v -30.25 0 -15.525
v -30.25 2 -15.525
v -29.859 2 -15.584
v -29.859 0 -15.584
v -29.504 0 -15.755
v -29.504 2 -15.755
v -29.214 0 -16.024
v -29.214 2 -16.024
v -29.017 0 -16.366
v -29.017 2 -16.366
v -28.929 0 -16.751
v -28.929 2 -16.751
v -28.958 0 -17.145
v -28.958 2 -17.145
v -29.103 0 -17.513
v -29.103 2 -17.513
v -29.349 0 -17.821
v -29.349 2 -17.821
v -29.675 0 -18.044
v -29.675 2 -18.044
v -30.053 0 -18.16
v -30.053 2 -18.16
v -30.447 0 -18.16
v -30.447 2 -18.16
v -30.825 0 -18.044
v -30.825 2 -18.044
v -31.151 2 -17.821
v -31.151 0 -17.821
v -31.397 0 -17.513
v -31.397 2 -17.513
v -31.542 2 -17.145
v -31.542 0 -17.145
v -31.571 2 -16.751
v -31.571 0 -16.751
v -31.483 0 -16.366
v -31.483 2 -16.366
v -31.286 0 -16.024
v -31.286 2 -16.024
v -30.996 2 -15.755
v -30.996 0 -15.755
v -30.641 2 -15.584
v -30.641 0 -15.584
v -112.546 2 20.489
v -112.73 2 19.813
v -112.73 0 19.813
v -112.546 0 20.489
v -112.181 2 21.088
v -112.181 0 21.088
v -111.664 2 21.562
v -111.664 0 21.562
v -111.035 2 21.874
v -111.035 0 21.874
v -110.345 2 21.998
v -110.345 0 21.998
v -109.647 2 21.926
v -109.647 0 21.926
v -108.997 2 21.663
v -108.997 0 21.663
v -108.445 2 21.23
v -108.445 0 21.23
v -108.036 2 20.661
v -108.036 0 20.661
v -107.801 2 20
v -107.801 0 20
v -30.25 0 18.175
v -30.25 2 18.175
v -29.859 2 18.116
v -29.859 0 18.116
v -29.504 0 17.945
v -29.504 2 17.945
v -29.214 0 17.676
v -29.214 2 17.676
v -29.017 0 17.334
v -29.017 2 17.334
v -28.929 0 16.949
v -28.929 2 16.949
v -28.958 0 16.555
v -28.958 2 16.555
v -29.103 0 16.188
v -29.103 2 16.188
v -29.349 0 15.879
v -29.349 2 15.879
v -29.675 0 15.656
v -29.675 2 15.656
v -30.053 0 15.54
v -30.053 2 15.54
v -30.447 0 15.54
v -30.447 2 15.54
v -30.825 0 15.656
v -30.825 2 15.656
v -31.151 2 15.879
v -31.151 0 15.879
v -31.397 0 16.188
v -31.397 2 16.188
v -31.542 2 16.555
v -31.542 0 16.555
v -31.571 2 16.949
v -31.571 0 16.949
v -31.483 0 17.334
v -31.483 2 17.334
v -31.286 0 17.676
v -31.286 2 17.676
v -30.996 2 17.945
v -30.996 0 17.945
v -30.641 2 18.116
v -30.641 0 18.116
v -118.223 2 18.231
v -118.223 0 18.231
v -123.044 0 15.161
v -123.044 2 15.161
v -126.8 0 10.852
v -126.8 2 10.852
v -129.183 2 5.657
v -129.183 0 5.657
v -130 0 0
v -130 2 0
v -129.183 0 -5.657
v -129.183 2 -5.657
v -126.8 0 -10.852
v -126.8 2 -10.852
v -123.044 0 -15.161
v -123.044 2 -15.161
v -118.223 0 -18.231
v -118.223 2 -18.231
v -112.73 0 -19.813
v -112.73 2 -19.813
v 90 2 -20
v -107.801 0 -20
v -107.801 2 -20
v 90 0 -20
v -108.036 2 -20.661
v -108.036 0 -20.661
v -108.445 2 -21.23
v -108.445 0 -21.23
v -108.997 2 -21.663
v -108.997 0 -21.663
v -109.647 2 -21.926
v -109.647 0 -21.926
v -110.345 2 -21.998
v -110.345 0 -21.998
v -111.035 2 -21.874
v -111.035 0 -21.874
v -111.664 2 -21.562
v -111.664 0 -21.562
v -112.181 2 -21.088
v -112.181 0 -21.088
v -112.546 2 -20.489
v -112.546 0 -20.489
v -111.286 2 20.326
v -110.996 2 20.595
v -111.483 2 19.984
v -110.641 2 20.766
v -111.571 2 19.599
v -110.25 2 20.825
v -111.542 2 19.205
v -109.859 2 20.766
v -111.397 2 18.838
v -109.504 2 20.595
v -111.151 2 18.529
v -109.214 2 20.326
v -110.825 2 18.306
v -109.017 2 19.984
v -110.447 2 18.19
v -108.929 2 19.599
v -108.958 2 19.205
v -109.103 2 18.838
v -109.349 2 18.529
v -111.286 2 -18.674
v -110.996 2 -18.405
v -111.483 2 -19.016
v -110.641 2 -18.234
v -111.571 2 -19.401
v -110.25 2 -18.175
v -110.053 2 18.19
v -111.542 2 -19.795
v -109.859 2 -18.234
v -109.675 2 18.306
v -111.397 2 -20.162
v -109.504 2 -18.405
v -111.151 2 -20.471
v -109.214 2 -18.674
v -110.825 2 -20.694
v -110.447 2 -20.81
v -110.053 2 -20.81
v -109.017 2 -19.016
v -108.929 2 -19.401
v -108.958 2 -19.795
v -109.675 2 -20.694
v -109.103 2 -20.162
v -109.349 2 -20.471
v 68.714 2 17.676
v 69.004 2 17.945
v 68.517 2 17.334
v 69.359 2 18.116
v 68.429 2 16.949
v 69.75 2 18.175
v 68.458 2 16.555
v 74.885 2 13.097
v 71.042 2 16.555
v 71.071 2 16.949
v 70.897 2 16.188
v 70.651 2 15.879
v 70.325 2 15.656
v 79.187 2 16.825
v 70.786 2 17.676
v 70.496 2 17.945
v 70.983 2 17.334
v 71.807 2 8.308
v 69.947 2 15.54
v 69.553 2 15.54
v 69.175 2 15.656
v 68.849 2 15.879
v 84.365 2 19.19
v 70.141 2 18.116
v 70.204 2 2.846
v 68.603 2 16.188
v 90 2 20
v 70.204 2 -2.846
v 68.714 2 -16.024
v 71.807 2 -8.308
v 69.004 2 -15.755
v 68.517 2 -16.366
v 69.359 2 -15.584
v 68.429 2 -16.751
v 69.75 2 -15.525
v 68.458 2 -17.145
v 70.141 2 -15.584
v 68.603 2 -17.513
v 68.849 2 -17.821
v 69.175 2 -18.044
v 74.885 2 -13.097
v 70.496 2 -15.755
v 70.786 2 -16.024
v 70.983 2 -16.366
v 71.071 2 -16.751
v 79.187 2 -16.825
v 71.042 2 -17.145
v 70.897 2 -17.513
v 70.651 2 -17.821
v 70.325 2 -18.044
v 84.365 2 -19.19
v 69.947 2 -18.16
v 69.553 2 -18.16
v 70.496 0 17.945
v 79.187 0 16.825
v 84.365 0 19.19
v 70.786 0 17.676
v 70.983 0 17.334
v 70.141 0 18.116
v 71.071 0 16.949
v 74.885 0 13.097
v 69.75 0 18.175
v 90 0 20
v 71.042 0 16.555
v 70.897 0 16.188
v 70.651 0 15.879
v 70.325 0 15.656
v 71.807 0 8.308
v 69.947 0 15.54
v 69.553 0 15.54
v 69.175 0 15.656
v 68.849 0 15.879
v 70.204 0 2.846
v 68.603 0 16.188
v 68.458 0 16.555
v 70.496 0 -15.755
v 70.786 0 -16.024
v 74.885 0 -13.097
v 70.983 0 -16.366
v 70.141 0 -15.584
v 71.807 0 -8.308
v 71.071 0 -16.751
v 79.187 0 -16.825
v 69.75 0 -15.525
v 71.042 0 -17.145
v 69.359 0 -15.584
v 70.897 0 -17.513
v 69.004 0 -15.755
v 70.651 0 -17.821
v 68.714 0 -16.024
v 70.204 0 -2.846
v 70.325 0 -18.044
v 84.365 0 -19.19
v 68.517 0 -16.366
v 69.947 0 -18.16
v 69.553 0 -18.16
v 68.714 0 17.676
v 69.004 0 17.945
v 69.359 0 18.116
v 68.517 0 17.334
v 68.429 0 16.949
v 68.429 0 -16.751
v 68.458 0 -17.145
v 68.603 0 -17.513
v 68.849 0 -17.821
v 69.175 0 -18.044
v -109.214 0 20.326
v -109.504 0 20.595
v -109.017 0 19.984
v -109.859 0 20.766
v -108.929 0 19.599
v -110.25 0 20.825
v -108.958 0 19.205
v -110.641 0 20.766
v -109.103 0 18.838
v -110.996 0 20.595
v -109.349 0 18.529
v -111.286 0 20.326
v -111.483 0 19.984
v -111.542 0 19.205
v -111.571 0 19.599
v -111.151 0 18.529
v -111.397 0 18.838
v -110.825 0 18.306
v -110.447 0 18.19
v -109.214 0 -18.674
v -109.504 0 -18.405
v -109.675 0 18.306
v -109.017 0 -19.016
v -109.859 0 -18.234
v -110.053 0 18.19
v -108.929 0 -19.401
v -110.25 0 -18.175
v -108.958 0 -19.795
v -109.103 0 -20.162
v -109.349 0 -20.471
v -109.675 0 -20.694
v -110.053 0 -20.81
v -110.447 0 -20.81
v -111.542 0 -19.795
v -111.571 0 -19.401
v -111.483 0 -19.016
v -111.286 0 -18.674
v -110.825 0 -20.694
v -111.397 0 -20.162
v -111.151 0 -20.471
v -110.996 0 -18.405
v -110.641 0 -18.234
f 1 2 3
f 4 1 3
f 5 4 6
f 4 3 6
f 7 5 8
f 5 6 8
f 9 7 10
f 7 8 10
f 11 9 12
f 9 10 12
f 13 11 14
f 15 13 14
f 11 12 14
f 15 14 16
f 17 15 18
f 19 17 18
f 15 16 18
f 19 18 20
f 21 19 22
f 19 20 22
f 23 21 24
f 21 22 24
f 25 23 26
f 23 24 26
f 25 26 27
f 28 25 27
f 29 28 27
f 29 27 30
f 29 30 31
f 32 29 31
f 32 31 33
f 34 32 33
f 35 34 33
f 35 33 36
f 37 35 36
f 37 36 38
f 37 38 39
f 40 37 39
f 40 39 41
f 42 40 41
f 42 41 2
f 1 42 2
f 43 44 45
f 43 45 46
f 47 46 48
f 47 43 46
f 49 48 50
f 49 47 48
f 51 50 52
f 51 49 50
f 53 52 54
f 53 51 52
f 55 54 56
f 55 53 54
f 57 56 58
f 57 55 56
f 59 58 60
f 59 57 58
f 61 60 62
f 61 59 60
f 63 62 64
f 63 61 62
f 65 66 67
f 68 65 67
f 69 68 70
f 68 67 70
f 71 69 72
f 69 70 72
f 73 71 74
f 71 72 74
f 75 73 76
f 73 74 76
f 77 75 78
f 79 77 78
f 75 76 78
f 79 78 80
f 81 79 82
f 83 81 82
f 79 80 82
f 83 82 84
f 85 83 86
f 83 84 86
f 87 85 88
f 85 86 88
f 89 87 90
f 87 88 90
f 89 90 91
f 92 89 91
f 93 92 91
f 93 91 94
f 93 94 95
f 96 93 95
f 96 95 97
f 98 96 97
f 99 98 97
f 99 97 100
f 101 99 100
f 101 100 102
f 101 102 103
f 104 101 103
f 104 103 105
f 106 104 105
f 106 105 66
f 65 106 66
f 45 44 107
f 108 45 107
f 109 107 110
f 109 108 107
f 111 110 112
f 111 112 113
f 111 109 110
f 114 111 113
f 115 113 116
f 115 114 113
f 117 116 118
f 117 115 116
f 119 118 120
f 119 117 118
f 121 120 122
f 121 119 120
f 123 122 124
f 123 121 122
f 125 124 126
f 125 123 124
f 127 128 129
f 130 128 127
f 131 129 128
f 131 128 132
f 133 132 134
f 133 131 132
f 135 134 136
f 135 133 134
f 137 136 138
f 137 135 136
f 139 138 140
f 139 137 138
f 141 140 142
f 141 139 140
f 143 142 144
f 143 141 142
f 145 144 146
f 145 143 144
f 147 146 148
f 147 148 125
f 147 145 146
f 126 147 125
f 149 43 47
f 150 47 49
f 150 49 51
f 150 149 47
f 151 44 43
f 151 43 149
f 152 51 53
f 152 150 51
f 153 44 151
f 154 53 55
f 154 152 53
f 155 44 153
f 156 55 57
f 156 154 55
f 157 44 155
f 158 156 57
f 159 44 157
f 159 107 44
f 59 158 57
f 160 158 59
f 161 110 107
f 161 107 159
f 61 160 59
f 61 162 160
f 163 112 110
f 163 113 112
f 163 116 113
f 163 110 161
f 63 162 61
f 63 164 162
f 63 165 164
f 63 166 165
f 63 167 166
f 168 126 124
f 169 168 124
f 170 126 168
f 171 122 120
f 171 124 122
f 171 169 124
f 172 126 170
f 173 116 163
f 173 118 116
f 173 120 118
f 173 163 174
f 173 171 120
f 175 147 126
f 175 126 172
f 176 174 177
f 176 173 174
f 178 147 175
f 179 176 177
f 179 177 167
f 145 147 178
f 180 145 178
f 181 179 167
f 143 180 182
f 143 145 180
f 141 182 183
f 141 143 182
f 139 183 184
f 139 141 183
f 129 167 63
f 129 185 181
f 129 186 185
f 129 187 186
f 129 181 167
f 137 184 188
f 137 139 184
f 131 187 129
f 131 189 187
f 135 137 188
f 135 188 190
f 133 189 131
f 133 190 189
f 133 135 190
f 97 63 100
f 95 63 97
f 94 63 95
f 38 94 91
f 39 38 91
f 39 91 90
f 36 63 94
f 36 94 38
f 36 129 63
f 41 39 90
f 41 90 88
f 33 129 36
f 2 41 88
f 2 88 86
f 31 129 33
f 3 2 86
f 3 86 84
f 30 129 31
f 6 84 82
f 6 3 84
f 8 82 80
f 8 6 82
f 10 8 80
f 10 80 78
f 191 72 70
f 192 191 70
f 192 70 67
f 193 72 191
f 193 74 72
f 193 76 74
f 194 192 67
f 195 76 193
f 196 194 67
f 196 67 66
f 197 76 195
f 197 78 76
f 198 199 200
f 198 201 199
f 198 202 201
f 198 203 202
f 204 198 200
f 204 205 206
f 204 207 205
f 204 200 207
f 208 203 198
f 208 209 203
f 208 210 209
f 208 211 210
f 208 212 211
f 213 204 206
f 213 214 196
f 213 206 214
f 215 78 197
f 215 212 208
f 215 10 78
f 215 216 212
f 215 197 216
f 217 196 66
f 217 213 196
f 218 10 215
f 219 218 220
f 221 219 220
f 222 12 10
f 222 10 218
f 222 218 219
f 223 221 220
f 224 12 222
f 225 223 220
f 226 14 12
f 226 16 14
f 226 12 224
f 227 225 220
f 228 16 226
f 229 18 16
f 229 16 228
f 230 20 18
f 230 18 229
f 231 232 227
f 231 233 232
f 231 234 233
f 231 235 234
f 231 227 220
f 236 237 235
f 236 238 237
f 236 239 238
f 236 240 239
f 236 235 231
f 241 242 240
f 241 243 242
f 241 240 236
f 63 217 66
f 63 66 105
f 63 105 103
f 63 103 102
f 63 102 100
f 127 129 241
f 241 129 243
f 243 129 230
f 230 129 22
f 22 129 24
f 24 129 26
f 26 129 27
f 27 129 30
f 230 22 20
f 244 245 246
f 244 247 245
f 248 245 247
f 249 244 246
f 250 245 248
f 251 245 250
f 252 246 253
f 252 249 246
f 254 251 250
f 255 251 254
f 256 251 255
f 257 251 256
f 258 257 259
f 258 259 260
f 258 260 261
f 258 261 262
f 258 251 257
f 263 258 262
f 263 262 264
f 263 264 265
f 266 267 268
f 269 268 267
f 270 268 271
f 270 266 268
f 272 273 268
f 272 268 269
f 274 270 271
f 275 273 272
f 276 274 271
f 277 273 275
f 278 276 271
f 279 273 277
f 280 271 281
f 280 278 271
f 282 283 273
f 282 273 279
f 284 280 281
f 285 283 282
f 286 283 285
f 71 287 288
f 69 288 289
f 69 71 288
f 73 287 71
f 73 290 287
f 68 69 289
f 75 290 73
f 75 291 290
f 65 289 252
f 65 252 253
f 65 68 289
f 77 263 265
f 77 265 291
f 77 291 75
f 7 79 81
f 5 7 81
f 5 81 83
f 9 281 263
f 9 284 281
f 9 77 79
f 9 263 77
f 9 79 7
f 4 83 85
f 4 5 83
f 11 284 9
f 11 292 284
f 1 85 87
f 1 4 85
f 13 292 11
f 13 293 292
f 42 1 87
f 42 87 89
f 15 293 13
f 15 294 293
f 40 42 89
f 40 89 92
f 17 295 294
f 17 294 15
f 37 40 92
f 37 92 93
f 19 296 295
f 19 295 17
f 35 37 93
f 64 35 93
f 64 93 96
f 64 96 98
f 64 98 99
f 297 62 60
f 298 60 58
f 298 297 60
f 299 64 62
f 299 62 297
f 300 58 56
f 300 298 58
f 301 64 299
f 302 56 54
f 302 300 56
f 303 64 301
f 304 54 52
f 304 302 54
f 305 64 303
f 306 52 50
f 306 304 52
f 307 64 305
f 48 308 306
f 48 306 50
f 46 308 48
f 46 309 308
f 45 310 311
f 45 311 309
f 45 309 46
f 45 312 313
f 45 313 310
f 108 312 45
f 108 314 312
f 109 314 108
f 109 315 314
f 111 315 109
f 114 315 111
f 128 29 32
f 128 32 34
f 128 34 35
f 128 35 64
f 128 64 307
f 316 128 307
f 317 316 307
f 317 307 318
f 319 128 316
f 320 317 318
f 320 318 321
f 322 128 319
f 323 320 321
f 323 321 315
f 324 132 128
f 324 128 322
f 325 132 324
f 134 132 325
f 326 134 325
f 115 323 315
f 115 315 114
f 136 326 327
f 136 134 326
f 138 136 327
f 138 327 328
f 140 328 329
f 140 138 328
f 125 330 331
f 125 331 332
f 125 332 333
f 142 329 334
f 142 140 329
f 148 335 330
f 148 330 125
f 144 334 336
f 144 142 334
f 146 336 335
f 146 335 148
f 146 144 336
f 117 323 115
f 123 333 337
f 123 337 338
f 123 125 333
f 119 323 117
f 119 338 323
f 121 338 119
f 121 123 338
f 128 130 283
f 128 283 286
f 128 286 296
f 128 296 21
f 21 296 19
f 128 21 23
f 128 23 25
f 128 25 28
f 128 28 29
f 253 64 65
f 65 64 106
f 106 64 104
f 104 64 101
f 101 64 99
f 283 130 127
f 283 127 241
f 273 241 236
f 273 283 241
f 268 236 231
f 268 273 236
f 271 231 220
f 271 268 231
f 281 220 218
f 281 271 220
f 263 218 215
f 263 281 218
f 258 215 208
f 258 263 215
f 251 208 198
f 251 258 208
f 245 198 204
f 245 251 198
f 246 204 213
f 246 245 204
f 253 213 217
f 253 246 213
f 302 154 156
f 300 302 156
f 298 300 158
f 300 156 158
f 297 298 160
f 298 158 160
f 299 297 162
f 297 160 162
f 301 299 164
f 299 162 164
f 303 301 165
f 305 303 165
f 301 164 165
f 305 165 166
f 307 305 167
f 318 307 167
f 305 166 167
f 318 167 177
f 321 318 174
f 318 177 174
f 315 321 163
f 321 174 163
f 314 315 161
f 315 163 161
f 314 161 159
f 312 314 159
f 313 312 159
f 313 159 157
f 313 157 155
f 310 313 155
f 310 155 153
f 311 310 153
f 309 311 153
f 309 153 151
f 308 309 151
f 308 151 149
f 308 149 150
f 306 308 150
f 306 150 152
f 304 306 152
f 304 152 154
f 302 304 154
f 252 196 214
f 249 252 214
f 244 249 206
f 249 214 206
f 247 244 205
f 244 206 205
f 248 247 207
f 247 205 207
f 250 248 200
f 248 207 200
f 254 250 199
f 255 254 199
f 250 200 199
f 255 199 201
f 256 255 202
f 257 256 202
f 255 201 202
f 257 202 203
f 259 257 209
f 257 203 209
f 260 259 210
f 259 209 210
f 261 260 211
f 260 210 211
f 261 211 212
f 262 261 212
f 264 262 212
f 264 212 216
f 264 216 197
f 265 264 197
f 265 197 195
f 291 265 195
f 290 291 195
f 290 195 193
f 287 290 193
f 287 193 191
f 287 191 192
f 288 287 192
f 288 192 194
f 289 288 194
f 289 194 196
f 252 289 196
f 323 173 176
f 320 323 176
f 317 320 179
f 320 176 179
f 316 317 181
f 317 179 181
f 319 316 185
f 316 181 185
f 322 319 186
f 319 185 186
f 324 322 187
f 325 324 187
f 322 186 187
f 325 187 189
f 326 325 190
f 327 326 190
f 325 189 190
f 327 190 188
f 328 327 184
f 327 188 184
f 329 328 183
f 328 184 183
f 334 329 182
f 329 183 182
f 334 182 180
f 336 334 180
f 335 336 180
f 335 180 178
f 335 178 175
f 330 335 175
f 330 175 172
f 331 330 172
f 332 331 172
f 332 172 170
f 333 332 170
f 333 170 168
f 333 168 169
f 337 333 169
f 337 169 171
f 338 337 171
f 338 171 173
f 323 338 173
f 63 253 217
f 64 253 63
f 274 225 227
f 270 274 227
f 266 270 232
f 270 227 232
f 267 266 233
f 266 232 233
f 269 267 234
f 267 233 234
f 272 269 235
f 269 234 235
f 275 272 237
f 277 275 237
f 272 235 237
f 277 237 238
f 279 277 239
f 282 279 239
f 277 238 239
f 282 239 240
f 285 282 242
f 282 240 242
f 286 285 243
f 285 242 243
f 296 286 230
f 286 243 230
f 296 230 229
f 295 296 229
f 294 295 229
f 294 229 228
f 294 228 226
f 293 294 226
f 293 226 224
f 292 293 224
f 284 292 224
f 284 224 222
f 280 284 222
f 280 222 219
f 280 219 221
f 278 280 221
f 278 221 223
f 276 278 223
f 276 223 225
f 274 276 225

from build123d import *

# Parameters (mm, degrees)
BOSS_EXTRUDE1_DEPTH = 2
SKETCH3_R           = 1.325
CUT_EXTRUDE2_DEPTH  = 3
SKETCH6_R           = 2.5
BOSS_EXTRUDE2_DEPTH = 2
SKETCH7_R           = 1.325
CUT_EXTRUDE3_DEPTH  = 132.863565855


with BuildPart() as part:
    # Sketch1 → Boss-Extrude1 (new body)
    with BuildSketch(Plane(origin=(0, 0, 0), x_dir=(1, 0, 0), z_dir=(0, 1, 0))):
        with BuildLine():
            Line((-110, 20), (90, 20))
            ThreePointArc((90, 20), (70, 0), (90, -20))
            Line((90, -20), (-110, -20))
            ThreePointArc((-110, -20), (-130, 0), (-110, 20))
        make_face()
    extrude(amount=BOSS_EXTRUDE1_DEPTH)

    # Sketch3 → Cut-Extrude2 (cut)
    with BuildSketch(Plane(origin=(0, 2, 0), x_dir=(1, 0, 0), z_dir=(0, 1, 0))):
        with Locations(Location((69.75, -16.85, 0), (0, 0, 270))):
            Circle(SKETCH3_R)
        with Locations(Location((69.75, 16.85, 0), (0, 0, 270))):
            Circle(SKETCH3_R)
        with Locations(Location((-30.25, -16.85, 0), (0, 0, 270))):
            Circle(SKETCH3_R)
        with Locations(Location((-30.25, 16.85, 0), (0, 0, 270))):
            Circle(SKETCH3_R)
    extrude(amount=-CUT_EXTRUDE2_DEPTH, mode=Mode.SUBTRACT)

    # Sketch6 → Boss-Extrude2 (add)
    with BuildSketch(Plane(origin=(0, 2, 0), x_dir=(1, 0, 0), z_dir=(0, 1, 0))):
        with Locations((-110.25, -19.5)):
            Circle(SKETCH6_R)
        with Locations((-110.25, 19.5)):
            Circle(SKETCH6_R)
    extrude(amount=-BOSS_EXTRUDE2_DEPTH)

    # Sketch7 → Cut-Extrude3 (cut, through all)
    with BuildSketch(Plane(origin=(0, 2, 0), x_dir=(1, 0, 0), z_dir=(0, 1, 0))):
        with Locations(Location((-110.25, 19.5, 0), (0, 0, 270))):
            Circle(SKETCH7_R)
        with Locations(Location((-110.25, -19.5, 0), (0, 0, 270))):
            Circle(SKETCH7_R)
    extrude(amount=-CUT_EXTRUDE3_DEPTH, mode=Mode.SUBTRACT)


solid = part.part
